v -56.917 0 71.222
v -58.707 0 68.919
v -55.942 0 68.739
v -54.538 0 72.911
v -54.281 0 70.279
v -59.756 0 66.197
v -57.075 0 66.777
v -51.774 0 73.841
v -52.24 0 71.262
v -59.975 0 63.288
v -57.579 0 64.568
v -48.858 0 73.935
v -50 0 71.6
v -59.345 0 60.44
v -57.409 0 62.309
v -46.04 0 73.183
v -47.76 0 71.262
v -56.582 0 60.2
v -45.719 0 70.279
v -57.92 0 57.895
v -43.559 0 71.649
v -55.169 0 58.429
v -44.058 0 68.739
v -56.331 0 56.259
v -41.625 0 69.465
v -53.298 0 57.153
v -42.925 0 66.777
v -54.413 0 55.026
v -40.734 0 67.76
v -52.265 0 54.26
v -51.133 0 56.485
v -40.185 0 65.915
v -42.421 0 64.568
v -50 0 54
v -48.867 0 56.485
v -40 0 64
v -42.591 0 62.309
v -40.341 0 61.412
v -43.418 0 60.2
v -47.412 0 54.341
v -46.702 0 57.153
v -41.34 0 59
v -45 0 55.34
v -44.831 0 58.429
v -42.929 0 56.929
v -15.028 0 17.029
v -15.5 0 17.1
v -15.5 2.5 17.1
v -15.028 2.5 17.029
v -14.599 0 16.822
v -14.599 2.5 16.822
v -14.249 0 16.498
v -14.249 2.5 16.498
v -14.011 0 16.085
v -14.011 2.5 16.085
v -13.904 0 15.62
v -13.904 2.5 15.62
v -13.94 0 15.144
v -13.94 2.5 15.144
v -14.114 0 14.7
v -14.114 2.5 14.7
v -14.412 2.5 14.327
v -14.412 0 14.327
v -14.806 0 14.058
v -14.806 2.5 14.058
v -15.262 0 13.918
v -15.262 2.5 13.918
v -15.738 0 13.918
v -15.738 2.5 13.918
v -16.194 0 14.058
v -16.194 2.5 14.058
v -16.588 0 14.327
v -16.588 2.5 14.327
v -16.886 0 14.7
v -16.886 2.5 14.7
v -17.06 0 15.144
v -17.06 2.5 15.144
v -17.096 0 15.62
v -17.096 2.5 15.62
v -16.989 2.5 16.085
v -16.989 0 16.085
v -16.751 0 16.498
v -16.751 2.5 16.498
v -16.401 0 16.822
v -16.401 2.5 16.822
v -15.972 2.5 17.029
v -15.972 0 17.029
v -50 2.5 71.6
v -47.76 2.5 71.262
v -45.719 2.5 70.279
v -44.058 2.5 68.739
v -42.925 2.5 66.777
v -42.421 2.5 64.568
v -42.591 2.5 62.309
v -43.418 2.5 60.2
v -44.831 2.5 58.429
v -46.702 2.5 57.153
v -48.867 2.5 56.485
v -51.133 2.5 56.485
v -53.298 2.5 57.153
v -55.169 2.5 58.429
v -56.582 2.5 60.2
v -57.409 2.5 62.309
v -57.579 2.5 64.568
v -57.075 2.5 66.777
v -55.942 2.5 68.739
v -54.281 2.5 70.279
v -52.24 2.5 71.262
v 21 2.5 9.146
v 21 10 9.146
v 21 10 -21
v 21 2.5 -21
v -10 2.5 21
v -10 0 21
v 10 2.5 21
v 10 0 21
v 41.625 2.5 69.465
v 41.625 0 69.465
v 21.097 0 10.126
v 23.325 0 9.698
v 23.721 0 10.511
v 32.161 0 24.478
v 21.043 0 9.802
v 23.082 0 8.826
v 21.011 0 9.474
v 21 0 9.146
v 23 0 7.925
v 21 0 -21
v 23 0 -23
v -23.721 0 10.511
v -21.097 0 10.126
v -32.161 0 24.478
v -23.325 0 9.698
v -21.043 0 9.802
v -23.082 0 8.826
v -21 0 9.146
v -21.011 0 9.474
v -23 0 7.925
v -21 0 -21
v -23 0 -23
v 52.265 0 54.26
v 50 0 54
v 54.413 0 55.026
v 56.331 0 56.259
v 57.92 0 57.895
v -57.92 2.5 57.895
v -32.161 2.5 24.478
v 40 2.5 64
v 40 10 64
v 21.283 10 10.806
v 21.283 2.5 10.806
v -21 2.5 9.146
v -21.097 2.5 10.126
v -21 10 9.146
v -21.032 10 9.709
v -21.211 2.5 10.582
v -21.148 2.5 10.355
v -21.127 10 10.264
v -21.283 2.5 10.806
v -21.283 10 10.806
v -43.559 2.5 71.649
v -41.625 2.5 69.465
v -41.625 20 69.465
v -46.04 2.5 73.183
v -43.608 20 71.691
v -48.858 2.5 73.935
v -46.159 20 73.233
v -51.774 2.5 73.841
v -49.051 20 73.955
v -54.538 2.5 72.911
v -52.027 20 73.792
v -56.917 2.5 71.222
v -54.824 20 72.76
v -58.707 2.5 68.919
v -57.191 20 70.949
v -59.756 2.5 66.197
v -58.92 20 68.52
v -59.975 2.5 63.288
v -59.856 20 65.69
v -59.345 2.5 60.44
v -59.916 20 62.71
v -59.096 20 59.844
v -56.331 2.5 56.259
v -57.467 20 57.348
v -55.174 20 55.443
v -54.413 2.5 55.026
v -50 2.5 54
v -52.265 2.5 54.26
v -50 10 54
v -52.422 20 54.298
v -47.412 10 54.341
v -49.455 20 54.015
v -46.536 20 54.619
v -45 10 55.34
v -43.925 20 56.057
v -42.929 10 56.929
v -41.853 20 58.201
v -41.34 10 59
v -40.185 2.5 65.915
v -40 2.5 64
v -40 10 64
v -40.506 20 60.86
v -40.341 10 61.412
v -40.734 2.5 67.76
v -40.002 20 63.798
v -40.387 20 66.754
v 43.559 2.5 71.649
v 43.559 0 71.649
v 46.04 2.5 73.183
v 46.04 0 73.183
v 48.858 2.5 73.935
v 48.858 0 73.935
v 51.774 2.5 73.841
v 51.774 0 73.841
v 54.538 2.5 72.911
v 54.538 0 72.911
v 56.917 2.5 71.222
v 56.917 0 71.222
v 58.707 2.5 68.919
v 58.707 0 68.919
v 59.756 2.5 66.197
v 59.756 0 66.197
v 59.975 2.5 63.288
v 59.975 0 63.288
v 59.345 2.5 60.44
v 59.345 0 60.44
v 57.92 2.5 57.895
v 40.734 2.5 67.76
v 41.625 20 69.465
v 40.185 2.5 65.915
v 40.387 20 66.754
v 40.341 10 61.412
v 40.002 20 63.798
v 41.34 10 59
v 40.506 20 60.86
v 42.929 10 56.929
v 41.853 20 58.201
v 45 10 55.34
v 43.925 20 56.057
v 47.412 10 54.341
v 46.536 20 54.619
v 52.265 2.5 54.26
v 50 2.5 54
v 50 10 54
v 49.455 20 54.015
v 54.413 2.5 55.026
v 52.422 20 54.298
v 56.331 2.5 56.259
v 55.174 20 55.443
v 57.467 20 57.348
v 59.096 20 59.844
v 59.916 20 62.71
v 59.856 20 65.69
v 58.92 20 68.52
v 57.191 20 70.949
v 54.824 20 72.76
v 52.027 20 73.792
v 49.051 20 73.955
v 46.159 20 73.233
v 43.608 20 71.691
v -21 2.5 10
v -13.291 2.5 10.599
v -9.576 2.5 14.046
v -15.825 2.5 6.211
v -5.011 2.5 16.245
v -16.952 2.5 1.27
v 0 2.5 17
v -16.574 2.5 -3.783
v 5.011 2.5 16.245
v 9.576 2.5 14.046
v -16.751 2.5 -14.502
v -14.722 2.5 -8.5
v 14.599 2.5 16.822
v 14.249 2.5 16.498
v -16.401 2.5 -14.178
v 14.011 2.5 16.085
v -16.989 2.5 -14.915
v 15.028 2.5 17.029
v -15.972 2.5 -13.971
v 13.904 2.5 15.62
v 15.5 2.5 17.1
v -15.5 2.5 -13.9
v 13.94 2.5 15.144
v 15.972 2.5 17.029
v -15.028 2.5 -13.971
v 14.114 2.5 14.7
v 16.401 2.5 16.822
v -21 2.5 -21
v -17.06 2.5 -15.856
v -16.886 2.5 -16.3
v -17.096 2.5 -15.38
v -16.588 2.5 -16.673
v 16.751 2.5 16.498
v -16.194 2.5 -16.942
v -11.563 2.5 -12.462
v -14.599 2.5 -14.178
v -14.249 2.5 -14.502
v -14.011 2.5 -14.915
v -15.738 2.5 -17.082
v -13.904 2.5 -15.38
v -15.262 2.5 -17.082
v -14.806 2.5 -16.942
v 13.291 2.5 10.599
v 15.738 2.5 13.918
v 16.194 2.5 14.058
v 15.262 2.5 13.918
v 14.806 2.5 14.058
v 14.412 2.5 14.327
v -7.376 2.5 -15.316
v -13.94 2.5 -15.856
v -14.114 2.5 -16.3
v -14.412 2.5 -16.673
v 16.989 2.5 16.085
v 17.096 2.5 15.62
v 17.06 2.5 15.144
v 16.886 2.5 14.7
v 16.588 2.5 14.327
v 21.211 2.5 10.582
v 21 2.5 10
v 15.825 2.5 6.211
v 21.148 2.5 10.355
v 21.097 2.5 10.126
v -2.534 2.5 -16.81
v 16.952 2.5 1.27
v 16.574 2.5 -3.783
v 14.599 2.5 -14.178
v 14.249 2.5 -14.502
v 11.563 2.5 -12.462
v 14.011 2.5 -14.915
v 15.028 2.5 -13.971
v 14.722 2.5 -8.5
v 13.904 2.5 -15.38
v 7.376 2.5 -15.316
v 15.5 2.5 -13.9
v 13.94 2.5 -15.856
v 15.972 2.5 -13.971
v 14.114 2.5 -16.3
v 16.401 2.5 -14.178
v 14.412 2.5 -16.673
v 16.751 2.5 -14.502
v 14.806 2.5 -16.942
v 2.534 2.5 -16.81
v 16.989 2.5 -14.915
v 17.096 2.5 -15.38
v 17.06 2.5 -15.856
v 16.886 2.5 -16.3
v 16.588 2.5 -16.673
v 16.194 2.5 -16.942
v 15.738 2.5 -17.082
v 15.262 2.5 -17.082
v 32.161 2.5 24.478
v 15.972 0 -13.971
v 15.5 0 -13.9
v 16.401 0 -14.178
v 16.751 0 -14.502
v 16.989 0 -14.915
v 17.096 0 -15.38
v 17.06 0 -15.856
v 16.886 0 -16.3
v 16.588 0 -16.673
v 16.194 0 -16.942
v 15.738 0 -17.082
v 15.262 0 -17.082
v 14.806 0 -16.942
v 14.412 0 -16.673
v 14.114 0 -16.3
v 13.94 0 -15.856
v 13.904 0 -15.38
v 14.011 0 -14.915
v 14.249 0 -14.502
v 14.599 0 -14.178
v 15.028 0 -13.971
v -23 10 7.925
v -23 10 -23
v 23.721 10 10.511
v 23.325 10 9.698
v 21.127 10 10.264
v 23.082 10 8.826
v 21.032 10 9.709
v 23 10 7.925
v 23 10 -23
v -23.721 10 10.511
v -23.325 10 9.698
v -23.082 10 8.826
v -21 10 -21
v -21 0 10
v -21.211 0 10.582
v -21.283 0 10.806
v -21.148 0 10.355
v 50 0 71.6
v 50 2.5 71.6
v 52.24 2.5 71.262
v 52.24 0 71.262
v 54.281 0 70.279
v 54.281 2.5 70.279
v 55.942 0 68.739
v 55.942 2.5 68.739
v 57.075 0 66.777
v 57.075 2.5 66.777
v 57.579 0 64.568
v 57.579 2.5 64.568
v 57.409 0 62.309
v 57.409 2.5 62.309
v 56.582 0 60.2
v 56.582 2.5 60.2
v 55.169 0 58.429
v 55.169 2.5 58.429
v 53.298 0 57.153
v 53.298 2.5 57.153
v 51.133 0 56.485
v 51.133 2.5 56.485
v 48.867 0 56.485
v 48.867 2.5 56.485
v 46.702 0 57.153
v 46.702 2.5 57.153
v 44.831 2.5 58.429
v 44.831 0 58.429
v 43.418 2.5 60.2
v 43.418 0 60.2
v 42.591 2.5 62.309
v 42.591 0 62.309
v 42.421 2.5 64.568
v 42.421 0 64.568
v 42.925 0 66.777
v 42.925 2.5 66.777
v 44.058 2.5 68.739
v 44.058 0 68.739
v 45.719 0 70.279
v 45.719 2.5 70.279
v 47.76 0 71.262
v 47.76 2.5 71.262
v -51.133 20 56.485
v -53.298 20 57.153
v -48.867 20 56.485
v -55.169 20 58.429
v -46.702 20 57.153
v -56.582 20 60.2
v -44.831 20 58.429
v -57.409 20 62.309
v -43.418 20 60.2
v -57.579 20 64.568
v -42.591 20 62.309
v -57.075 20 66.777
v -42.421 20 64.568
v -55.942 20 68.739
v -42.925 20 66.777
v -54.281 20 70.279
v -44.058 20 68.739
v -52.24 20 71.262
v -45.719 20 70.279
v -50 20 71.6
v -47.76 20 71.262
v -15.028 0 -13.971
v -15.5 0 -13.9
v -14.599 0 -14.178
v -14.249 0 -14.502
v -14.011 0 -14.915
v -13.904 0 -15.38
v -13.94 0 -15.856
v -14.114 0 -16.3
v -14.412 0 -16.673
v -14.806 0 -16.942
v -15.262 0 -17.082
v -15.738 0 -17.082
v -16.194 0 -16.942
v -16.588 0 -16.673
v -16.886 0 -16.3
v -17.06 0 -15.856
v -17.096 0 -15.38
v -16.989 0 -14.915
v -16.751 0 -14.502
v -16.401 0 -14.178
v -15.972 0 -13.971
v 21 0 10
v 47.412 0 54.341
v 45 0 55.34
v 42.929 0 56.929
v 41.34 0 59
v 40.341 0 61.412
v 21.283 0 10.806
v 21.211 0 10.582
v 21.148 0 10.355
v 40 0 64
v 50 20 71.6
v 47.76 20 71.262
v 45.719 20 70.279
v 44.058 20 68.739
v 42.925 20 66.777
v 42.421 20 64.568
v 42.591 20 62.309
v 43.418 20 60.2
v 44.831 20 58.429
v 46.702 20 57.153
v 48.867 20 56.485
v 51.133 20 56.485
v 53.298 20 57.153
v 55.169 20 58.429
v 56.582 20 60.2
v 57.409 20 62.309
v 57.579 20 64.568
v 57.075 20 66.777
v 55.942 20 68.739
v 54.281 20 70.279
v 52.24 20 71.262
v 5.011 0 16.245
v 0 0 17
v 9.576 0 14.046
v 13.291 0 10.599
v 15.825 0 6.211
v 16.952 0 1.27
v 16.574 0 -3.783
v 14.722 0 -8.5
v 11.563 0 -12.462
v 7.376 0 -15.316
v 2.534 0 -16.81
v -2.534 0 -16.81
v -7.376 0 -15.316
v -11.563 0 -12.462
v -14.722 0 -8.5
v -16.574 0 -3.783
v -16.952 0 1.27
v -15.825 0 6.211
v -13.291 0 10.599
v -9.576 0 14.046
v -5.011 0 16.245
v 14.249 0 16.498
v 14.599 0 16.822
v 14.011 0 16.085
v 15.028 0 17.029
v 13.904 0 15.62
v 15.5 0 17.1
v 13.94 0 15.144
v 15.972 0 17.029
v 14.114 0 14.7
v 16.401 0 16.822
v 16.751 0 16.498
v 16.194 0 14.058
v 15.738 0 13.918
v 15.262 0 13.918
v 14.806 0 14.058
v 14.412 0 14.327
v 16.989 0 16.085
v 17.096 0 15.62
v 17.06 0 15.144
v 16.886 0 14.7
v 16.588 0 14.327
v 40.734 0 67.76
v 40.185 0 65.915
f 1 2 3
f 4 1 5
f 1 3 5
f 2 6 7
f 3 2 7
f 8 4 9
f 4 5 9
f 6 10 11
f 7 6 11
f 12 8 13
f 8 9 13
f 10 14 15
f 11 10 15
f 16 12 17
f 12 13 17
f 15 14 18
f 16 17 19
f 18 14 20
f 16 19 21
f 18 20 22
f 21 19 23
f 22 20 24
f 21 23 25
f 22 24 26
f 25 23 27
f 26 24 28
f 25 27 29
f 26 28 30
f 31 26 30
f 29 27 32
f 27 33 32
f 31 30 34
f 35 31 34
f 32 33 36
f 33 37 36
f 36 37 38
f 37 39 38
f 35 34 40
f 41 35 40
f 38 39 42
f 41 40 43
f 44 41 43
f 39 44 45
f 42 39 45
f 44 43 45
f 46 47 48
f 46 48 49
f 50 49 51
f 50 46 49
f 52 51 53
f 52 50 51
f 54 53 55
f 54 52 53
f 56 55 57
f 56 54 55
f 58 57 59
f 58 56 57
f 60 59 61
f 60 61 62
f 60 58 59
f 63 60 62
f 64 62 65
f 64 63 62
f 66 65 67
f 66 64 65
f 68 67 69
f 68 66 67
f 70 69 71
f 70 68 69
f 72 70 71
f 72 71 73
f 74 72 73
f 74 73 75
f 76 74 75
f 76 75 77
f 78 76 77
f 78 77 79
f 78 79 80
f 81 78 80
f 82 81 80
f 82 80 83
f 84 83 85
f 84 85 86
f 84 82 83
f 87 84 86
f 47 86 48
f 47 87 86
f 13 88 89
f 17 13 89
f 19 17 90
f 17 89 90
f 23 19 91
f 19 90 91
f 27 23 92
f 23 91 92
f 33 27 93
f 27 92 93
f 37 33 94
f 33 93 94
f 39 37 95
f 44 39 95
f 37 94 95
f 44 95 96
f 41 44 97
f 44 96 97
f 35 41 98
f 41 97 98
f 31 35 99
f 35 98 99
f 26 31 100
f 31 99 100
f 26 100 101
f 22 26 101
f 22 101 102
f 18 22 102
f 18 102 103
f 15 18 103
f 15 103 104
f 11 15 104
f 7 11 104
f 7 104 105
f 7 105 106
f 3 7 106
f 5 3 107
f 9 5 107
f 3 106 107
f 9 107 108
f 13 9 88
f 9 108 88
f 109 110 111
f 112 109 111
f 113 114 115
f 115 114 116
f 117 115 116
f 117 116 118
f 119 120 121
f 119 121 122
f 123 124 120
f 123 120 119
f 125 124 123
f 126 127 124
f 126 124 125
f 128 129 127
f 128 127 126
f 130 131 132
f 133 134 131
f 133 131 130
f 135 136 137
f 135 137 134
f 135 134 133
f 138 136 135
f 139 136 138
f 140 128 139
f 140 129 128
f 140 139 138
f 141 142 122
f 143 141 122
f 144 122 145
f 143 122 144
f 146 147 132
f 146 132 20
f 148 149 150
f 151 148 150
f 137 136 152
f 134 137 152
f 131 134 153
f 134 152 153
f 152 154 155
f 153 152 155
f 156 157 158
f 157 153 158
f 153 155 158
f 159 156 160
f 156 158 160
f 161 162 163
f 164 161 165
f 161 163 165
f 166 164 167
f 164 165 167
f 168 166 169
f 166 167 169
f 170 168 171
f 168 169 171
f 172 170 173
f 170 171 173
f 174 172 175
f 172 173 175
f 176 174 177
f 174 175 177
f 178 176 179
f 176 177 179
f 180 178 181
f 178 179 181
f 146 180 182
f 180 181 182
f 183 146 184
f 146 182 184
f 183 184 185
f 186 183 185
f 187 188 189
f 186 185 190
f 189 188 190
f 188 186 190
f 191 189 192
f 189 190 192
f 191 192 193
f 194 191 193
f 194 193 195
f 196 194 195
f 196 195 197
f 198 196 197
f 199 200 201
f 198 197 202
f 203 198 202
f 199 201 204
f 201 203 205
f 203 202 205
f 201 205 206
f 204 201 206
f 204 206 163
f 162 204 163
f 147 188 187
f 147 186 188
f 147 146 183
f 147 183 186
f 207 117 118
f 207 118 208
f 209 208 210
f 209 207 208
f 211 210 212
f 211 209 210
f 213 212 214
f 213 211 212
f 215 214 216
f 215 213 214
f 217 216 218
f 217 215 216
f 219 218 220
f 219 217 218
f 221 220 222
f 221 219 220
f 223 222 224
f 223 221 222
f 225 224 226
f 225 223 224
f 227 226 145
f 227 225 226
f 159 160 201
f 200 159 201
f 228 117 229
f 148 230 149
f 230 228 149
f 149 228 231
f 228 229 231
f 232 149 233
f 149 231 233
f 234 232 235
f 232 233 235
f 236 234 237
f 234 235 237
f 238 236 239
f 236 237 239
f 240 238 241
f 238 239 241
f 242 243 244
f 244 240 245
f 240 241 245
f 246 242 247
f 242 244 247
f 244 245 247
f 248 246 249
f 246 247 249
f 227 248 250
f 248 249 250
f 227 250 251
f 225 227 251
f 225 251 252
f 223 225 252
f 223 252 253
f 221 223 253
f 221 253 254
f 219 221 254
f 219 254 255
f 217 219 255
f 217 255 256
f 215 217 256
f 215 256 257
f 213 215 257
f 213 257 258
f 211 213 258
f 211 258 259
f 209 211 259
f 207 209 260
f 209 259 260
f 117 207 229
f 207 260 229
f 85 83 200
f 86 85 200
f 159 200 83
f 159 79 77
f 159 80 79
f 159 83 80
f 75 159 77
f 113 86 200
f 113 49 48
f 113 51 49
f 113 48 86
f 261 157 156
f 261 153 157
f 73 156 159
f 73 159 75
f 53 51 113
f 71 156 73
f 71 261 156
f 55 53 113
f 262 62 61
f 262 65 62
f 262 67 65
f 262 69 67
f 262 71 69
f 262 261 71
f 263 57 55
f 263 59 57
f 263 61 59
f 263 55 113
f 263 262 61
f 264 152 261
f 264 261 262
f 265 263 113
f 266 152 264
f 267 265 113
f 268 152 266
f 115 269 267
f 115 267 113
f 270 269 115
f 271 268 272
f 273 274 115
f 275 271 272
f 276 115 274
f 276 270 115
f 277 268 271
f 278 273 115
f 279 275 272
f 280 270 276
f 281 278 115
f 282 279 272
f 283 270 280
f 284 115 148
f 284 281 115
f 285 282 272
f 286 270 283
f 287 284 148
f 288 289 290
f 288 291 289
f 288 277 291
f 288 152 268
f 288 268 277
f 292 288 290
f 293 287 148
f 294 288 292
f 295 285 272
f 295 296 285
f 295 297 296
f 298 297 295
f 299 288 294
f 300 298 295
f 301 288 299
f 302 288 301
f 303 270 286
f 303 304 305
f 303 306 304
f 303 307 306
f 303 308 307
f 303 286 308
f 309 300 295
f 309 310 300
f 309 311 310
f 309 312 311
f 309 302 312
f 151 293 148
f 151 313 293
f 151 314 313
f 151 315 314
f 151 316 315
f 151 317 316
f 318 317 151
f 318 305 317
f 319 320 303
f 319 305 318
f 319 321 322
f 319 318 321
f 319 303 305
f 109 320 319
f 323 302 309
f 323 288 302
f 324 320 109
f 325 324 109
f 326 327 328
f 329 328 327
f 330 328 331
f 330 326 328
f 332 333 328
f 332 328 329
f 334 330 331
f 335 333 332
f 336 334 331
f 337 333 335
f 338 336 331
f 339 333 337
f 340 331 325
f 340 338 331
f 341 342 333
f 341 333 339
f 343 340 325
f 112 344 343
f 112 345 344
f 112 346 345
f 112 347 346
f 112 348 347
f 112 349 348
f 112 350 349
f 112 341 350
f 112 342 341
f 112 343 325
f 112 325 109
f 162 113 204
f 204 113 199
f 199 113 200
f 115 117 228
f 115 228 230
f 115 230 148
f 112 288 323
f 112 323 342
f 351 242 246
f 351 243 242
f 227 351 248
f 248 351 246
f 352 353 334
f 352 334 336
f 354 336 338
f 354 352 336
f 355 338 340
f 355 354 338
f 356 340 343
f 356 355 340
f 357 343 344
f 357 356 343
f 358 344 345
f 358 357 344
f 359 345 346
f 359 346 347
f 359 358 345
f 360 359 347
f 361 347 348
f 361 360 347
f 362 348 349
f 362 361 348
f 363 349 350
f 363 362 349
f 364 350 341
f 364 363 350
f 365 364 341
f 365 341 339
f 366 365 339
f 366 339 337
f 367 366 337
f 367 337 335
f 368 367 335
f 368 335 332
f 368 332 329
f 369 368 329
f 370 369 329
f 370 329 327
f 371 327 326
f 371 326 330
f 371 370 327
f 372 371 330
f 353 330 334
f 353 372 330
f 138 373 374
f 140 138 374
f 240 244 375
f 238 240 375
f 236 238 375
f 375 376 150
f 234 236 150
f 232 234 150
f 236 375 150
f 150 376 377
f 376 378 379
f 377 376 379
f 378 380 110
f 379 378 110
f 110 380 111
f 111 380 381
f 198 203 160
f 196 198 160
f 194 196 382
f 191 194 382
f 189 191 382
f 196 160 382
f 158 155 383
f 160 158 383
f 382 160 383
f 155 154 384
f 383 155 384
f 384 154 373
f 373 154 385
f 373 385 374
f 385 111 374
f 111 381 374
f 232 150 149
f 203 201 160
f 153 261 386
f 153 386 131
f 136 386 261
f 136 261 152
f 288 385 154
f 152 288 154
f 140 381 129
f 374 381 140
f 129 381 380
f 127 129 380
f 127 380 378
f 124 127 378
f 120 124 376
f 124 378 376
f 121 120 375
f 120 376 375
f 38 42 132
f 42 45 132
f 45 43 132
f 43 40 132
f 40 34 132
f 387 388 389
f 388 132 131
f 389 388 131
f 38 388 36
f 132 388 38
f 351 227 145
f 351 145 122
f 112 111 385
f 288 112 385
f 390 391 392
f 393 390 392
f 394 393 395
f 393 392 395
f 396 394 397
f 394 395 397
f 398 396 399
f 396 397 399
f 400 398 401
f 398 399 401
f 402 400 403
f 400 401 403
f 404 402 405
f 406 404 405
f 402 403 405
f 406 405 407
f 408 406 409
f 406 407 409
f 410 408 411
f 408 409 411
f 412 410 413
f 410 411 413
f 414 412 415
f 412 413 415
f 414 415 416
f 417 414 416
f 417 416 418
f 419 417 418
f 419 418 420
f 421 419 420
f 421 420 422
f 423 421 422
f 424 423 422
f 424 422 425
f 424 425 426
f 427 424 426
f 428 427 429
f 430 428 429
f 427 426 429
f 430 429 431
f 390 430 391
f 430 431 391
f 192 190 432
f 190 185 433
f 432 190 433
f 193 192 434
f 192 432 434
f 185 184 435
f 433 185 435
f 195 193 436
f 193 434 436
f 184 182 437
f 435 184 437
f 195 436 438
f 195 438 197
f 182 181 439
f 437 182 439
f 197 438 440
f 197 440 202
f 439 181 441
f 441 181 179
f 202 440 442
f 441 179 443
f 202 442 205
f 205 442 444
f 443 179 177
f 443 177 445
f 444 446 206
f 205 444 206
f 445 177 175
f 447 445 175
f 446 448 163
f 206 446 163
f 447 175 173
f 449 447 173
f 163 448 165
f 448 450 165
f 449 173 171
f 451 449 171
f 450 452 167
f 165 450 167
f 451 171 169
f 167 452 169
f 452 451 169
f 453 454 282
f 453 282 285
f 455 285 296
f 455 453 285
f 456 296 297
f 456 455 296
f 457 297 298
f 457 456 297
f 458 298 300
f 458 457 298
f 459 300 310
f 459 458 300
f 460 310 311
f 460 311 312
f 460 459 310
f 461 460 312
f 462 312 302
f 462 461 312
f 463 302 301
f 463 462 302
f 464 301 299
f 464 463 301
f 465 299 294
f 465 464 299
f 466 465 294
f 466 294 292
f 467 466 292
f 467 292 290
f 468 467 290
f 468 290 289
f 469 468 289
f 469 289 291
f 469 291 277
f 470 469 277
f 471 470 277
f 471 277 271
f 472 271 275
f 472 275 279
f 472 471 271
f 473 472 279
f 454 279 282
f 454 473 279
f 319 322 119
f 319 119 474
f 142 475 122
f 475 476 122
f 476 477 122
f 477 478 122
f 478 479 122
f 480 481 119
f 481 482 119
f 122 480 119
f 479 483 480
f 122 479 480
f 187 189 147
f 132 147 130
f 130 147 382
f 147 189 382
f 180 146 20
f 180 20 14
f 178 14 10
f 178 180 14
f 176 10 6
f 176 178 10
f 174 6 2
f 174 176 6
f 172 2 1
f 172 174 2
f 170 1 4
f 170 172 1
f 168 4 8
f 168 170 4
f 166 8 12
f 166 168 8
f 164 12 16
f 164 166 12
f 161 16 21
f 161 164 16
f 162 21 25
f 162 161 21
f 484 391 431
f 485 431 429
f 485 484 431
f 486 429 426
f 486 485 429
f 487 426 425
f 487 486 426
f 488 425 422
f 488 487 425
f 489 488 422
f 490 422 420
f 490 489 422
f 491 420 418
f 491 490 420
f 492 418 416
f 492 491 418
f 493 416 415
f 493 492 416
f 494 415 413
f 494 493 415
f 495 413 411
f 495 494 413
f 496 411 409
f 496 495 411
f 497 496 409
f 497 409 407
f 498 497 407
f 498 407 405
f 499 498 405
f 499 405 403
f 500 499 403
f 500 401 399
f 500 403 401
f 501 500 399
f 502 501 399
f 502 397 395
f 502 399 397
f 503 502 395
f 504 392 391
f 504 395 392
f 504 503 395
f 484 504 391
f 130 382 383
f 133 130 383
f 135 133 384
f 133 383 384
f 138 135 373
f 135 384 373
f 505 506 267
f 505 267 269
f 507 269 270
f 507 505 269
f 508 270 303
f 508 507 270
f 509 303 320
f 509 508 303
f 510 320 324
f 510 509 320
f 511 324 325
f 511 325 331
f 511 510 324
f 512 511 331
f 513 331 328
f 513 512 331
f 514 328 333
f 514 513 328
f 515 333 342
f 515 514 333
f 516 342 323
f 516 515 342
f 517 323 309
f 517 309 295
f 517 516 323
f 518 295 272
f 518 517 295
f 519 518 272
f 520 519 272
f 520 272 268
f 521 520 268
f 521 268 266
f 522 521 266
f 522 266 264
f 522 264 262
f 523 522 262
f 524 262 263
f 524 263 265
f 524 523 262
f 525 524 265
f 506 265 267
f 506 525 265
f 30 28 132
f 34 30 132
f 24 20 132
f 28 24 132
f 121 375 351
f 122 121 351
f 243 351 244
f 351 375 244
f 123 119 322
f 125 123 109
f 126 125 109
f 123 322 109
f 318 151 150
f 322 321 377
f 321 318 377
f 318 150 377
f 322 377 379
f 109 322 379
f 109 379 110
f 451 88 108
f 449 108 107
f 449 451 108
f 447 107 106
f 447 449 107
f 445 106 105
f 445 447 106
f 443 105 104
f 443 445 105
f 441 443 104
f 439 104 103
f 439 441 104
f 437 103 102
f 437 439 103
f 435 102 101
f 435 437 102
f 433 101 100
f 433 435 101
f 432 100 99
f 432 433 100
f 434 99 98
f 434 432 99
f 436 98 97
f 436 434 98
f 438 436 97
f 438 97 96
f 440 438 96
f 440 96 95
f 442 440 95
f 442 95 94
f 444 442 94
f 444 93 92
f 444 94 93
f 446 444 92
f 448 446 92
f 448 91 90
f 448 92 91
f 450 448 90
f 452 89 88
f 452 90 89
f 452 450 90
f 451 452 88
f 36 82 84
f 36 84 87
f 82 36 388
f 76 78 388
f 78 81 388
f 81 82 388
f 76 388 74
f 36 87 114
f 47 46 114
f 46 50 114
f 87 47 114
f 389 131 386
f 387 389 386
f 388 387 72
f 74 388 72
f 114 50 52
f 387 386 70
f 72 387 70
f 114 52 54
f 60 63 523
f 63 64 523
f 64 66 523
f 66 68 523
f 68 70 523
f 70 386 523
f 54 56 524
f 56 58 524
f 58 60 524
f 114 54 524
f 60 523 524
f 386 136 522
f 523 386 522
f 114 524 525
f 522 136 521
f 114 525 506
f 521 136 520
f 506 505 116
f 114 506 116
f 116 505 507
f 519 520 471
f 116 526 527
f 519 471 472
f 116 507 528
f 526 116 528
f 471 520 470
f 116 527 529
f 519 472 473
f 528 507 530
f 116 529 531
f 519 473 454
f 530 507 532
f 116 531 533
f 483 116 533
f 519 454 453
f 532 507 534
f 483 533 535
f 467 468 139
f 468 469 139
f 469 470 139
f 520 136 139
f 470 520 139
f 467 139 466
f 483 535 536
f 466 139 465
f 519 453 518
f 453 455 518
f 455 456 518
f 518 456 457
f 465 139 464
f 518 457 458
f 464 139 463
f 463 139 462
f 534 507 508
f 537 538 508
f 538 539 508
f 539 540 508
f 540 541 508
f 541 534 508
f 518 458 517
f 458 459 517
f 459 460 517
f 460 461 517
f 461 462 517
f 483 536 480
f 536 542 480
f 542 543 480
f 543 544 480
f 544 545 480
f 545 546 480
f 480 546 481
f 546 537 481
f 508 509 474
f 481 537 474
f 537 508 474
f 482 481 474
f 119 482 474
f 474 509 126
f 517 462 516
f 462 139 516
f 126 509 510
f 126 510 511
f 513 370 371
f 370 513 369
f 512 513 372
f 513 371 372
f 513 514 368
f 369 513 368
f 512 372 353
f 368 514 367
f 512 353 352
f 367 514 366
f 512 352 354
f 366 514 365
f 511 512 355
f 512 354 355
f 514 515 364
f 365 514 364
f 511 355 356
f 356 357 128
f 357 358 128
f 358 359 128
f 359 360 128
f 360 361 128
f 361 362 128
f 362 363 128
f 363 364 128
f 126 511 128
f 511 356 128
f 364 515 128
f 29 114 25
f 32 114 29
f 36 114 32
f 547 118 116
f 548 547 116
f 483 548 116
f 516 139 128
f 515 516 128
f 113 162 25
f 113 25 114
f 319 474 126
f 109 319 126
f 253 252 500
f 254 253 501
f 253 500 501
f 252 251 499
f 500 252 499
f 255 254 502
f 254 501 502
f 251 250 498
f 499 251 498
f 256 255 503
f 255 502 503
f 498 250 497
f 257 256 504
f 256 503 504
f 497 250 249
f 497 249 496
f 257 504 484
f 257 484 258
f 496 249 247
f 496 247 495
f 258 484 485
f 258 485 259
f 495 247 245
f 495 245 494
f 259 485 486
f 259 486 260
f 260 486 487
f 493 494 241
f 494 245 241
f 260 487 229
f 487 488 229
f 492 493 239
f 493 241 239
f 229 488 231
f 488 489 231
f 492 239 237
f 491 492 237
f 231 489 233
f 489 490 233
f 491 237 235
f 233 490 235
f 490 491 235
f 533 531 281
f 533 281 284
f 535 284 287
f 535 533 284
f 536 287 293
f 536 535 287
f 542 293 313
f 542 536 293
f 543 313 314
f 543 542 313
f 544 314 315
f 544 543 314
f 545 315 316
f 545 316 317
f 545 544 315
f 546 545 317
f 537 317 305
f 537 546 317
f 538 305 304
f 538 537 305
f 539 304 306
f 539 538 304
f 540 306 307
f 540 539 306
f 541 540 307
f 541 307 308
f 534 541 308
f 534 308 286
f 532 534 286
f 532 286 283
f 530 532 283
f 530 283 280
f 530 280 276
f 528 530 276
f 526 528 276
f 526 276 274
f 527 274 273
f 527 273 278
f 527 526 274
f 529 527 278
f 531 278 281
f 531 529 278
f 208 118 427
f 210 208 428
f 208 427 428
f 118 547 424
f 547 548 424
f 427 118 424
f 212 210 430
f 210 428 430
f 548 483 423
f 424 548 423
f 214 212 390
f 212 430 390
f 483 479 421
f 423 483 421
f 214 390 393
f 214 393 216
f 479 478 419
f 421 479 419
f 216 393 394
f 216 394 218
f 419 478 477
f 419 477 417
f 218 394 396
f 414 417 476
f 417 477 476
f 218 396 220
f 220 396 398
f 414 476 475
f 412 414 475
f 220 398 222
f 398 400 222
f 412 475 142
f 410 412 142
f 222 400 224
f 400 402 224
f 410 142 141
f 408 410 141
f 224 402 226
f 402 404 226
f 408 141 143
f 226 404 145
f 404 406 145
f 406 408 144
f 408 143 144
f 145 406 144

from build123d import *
from build123d.topology import SkipClean

# Parameters (mm, degrees)
SKETCH_6_W       = 42
SKETCH_6_H       = 42
SKETCH_6_R       = 1.6
SKETCH_6_R_2     = 17
EXTRUDE_1_DEPTH  = 2.5
SKETCH_7_R       = 7.6
EXTRUDE_5_DEPTH  = 2.5
EXTRUDE_START    = -20
SKETCH_9_R       = 10
SKETCH_9_R_2     = 7.6
EXTRUDE_7_DEPTH  = 20
EXTRUDE_START_2  = 10
EXTRUDE_11_DEPTH = 10


with BuildPart() as part:
    # 草图6 → 凸台-拉伸1 (new body)
    with BuildSketch(Plane(origin=(0, 0, 0), x_dir=(1, 0, 0), z_dir=(0, 1, 0))):
        Rectangle(SKETCH_6_W, SKETCH_6_H)
        with Locations(Location((15.5, 15.5, 0), (0, 0, 270))):
            Circle(SKETCH_6_R, mode=Mode.SUBTRACT)
        with Locations(Location((-15.5, 15.5, 0), (0, 0, 270))):
            Circle(SKETCH_6_R, mode=Mode.SUBTRACT)
        with Locations(Location((-15.5, -15.5, 0), (0, 0, 270))):
            Circle(SKETCH_6_R, mode=Mode.SUBTRACT)
        with Locations(Location((15.5, -15.5, 0), (0, 0, 270))):
            Circle(SKETCH_6_R, mode=Mode.SUBTRACT)
        with Locations(Location((0, 0, 0), (0, 0, 270))):
            Circle(SKETCH_6_R_2, mode=Mode.SUBTRACT)
    extrude(amount=EXTRUDE_1_DEPTH)

    # 草图7 → 凸台-拉伸5 (add)
    # profile 1 of 2: a face of its own
    with BuildSketch(Plane(origin=(0, 2.5, 0), x_dir=(1, 0, 0), z_dir=(0, 1, 0))):
        with BuildLine():
            Line((-21, -21), (-21, -10))
            Line((-21, -10), (-57.920014013, -57.894807289))
            ThreePointArc((-57.920014013, -57.894807289), (-55.789479543, -72.15364499), (-41.625301702, -69.464835626))
            Line((-41.625301702, -69.464835626), (-10, -21))
            Line((-10, -21), (-21, -21))
        make_face()
        with Locations(Location((-50, -64, 0), (0, 0, 270))):
            Circle(SKETCH_7_R, mode=Mode.SUBTRACT)
    # profile 2 of 2: a face of its own
    with BuildSketch(Plane(origin=(0, 2.5, 0), x_dir=(1, 0, 0), z_dir=(0, 1, 0))):
        with BuildLine():
            Line((57.920014013, -57.894807289), (21, -10))
            Line((21, -10), (21, -21))
            Line((21, -21), (10, -21))
            Line((10, -21), (41.625301702, -69.464835626))
            ThreePointArc((41.625301702, -69.464835626), (55.789479543, -72.15364499), (57.920014013, -57.894807289))
        make_face()
        with Locations(Location((50, -64, 0), (0, 0, 270))):
            Circle(SKETCH_7_R, mode=Mode.SUBTRACT)
    extrude(amount=-EXTRUDE_5_DEPTH)

    # 草图9 → 凸台-拉伸7 (add)
    # profile 1 of 2: a face of its own
    with SkipClean():  # the faces are left unmerged after this step: merging them gives an invalid solid
        with BuildSketch(Plane(origin=(0, 0, 0), x_dir=(-1, 0, 0), z_dir=(0, -1, 0)).offset(EXTRUDE_START)):
            with Locations(Location((50, -64, 0), (0, 0, 213.126103521))):
                Circle(SKETCH_9_R)
            with Locations(Location((50, -64, 0), (0, 0, 270))):
                Circle(SKETCH_9_R_2, mode=Mode.SUBTRACT)
        # profile 2 of 2: a face of its own
        with BuildSketch(Plane(origin=(0, 0, 0), x_dir=(-1, 0, 0), z_dir=(0, -1, 0)).offset(EXTRUDE_START)):
            with Locations(Location((-50, -64, 0), (0, 0, 326.873896479))):
                Circle(SKETCH_9_R)
            with Locations(Location((-50, -64, 0), (0, 0, 270))):
                Circle(SKETCH_9_R_2, mode=Mode.SUBTRACT)
        extrude(amount=EXTRUDE_7_DEPTH)

    # 草图10 → 凸台-拉伸11 (add)
    with SkipClean():  # the faces are left unmerged after this step: merging them gives an invalid solid
        with BuildSketch(Plane(origin=(0, 0, 0), x_dir=(1, 0, 0), z_dir=(0, 1, 0)).offset(EXTRUDE_START_2)):
            with BuildLine():
                Line((-50, -54), (-23.720634175, -10.511170428))
                ThreePointArc((-23.720634175, -10.511170428), (-23.18352675, -9.267473069), (-23, -7.925241555))
                Line((-23, -7.925241555), (-23, 23))
                Line((-23, 23), (0, 23))
                Line((0, 23), (23, 23))
                Line((23, 23), (23, -7.925241555))
                ThreePointArc((23, -7.925241555), (23.18352675, -9.267473069), (23.720634175, -10.511170428))
                Line((23.720634175, -10.511170428), (50, -54))
                ThreePointArc((50, -54), (42.928932188, -56.928932188), (40, -64))
                Line((40, -64), (21.283438046, -10.805560762))
                ThreePointArc((21.283438046, -10.805560762), (21.071368863, -9.987810622), (21, -9.146029704))
                Line((21, -9.146029704), (21, 21))
                Line((21, 21), (-21, 21))
                Line((-21, 21), (-21, -9.146029704))
                ThreePointArc((-21, -9.146029704), (-21.071368863, -9.987810622), (-21.283438046, -10.805560762))
                Line((-21.283438046, -10.805560762), (-40, -64))
                ThreePointArc((-40, -64), (-42.928932188, -56.928932188), (-50, -54))
            make_face()
        extrude(amount=-EXTRUDE_11_DEPTH)


solid = part.part
